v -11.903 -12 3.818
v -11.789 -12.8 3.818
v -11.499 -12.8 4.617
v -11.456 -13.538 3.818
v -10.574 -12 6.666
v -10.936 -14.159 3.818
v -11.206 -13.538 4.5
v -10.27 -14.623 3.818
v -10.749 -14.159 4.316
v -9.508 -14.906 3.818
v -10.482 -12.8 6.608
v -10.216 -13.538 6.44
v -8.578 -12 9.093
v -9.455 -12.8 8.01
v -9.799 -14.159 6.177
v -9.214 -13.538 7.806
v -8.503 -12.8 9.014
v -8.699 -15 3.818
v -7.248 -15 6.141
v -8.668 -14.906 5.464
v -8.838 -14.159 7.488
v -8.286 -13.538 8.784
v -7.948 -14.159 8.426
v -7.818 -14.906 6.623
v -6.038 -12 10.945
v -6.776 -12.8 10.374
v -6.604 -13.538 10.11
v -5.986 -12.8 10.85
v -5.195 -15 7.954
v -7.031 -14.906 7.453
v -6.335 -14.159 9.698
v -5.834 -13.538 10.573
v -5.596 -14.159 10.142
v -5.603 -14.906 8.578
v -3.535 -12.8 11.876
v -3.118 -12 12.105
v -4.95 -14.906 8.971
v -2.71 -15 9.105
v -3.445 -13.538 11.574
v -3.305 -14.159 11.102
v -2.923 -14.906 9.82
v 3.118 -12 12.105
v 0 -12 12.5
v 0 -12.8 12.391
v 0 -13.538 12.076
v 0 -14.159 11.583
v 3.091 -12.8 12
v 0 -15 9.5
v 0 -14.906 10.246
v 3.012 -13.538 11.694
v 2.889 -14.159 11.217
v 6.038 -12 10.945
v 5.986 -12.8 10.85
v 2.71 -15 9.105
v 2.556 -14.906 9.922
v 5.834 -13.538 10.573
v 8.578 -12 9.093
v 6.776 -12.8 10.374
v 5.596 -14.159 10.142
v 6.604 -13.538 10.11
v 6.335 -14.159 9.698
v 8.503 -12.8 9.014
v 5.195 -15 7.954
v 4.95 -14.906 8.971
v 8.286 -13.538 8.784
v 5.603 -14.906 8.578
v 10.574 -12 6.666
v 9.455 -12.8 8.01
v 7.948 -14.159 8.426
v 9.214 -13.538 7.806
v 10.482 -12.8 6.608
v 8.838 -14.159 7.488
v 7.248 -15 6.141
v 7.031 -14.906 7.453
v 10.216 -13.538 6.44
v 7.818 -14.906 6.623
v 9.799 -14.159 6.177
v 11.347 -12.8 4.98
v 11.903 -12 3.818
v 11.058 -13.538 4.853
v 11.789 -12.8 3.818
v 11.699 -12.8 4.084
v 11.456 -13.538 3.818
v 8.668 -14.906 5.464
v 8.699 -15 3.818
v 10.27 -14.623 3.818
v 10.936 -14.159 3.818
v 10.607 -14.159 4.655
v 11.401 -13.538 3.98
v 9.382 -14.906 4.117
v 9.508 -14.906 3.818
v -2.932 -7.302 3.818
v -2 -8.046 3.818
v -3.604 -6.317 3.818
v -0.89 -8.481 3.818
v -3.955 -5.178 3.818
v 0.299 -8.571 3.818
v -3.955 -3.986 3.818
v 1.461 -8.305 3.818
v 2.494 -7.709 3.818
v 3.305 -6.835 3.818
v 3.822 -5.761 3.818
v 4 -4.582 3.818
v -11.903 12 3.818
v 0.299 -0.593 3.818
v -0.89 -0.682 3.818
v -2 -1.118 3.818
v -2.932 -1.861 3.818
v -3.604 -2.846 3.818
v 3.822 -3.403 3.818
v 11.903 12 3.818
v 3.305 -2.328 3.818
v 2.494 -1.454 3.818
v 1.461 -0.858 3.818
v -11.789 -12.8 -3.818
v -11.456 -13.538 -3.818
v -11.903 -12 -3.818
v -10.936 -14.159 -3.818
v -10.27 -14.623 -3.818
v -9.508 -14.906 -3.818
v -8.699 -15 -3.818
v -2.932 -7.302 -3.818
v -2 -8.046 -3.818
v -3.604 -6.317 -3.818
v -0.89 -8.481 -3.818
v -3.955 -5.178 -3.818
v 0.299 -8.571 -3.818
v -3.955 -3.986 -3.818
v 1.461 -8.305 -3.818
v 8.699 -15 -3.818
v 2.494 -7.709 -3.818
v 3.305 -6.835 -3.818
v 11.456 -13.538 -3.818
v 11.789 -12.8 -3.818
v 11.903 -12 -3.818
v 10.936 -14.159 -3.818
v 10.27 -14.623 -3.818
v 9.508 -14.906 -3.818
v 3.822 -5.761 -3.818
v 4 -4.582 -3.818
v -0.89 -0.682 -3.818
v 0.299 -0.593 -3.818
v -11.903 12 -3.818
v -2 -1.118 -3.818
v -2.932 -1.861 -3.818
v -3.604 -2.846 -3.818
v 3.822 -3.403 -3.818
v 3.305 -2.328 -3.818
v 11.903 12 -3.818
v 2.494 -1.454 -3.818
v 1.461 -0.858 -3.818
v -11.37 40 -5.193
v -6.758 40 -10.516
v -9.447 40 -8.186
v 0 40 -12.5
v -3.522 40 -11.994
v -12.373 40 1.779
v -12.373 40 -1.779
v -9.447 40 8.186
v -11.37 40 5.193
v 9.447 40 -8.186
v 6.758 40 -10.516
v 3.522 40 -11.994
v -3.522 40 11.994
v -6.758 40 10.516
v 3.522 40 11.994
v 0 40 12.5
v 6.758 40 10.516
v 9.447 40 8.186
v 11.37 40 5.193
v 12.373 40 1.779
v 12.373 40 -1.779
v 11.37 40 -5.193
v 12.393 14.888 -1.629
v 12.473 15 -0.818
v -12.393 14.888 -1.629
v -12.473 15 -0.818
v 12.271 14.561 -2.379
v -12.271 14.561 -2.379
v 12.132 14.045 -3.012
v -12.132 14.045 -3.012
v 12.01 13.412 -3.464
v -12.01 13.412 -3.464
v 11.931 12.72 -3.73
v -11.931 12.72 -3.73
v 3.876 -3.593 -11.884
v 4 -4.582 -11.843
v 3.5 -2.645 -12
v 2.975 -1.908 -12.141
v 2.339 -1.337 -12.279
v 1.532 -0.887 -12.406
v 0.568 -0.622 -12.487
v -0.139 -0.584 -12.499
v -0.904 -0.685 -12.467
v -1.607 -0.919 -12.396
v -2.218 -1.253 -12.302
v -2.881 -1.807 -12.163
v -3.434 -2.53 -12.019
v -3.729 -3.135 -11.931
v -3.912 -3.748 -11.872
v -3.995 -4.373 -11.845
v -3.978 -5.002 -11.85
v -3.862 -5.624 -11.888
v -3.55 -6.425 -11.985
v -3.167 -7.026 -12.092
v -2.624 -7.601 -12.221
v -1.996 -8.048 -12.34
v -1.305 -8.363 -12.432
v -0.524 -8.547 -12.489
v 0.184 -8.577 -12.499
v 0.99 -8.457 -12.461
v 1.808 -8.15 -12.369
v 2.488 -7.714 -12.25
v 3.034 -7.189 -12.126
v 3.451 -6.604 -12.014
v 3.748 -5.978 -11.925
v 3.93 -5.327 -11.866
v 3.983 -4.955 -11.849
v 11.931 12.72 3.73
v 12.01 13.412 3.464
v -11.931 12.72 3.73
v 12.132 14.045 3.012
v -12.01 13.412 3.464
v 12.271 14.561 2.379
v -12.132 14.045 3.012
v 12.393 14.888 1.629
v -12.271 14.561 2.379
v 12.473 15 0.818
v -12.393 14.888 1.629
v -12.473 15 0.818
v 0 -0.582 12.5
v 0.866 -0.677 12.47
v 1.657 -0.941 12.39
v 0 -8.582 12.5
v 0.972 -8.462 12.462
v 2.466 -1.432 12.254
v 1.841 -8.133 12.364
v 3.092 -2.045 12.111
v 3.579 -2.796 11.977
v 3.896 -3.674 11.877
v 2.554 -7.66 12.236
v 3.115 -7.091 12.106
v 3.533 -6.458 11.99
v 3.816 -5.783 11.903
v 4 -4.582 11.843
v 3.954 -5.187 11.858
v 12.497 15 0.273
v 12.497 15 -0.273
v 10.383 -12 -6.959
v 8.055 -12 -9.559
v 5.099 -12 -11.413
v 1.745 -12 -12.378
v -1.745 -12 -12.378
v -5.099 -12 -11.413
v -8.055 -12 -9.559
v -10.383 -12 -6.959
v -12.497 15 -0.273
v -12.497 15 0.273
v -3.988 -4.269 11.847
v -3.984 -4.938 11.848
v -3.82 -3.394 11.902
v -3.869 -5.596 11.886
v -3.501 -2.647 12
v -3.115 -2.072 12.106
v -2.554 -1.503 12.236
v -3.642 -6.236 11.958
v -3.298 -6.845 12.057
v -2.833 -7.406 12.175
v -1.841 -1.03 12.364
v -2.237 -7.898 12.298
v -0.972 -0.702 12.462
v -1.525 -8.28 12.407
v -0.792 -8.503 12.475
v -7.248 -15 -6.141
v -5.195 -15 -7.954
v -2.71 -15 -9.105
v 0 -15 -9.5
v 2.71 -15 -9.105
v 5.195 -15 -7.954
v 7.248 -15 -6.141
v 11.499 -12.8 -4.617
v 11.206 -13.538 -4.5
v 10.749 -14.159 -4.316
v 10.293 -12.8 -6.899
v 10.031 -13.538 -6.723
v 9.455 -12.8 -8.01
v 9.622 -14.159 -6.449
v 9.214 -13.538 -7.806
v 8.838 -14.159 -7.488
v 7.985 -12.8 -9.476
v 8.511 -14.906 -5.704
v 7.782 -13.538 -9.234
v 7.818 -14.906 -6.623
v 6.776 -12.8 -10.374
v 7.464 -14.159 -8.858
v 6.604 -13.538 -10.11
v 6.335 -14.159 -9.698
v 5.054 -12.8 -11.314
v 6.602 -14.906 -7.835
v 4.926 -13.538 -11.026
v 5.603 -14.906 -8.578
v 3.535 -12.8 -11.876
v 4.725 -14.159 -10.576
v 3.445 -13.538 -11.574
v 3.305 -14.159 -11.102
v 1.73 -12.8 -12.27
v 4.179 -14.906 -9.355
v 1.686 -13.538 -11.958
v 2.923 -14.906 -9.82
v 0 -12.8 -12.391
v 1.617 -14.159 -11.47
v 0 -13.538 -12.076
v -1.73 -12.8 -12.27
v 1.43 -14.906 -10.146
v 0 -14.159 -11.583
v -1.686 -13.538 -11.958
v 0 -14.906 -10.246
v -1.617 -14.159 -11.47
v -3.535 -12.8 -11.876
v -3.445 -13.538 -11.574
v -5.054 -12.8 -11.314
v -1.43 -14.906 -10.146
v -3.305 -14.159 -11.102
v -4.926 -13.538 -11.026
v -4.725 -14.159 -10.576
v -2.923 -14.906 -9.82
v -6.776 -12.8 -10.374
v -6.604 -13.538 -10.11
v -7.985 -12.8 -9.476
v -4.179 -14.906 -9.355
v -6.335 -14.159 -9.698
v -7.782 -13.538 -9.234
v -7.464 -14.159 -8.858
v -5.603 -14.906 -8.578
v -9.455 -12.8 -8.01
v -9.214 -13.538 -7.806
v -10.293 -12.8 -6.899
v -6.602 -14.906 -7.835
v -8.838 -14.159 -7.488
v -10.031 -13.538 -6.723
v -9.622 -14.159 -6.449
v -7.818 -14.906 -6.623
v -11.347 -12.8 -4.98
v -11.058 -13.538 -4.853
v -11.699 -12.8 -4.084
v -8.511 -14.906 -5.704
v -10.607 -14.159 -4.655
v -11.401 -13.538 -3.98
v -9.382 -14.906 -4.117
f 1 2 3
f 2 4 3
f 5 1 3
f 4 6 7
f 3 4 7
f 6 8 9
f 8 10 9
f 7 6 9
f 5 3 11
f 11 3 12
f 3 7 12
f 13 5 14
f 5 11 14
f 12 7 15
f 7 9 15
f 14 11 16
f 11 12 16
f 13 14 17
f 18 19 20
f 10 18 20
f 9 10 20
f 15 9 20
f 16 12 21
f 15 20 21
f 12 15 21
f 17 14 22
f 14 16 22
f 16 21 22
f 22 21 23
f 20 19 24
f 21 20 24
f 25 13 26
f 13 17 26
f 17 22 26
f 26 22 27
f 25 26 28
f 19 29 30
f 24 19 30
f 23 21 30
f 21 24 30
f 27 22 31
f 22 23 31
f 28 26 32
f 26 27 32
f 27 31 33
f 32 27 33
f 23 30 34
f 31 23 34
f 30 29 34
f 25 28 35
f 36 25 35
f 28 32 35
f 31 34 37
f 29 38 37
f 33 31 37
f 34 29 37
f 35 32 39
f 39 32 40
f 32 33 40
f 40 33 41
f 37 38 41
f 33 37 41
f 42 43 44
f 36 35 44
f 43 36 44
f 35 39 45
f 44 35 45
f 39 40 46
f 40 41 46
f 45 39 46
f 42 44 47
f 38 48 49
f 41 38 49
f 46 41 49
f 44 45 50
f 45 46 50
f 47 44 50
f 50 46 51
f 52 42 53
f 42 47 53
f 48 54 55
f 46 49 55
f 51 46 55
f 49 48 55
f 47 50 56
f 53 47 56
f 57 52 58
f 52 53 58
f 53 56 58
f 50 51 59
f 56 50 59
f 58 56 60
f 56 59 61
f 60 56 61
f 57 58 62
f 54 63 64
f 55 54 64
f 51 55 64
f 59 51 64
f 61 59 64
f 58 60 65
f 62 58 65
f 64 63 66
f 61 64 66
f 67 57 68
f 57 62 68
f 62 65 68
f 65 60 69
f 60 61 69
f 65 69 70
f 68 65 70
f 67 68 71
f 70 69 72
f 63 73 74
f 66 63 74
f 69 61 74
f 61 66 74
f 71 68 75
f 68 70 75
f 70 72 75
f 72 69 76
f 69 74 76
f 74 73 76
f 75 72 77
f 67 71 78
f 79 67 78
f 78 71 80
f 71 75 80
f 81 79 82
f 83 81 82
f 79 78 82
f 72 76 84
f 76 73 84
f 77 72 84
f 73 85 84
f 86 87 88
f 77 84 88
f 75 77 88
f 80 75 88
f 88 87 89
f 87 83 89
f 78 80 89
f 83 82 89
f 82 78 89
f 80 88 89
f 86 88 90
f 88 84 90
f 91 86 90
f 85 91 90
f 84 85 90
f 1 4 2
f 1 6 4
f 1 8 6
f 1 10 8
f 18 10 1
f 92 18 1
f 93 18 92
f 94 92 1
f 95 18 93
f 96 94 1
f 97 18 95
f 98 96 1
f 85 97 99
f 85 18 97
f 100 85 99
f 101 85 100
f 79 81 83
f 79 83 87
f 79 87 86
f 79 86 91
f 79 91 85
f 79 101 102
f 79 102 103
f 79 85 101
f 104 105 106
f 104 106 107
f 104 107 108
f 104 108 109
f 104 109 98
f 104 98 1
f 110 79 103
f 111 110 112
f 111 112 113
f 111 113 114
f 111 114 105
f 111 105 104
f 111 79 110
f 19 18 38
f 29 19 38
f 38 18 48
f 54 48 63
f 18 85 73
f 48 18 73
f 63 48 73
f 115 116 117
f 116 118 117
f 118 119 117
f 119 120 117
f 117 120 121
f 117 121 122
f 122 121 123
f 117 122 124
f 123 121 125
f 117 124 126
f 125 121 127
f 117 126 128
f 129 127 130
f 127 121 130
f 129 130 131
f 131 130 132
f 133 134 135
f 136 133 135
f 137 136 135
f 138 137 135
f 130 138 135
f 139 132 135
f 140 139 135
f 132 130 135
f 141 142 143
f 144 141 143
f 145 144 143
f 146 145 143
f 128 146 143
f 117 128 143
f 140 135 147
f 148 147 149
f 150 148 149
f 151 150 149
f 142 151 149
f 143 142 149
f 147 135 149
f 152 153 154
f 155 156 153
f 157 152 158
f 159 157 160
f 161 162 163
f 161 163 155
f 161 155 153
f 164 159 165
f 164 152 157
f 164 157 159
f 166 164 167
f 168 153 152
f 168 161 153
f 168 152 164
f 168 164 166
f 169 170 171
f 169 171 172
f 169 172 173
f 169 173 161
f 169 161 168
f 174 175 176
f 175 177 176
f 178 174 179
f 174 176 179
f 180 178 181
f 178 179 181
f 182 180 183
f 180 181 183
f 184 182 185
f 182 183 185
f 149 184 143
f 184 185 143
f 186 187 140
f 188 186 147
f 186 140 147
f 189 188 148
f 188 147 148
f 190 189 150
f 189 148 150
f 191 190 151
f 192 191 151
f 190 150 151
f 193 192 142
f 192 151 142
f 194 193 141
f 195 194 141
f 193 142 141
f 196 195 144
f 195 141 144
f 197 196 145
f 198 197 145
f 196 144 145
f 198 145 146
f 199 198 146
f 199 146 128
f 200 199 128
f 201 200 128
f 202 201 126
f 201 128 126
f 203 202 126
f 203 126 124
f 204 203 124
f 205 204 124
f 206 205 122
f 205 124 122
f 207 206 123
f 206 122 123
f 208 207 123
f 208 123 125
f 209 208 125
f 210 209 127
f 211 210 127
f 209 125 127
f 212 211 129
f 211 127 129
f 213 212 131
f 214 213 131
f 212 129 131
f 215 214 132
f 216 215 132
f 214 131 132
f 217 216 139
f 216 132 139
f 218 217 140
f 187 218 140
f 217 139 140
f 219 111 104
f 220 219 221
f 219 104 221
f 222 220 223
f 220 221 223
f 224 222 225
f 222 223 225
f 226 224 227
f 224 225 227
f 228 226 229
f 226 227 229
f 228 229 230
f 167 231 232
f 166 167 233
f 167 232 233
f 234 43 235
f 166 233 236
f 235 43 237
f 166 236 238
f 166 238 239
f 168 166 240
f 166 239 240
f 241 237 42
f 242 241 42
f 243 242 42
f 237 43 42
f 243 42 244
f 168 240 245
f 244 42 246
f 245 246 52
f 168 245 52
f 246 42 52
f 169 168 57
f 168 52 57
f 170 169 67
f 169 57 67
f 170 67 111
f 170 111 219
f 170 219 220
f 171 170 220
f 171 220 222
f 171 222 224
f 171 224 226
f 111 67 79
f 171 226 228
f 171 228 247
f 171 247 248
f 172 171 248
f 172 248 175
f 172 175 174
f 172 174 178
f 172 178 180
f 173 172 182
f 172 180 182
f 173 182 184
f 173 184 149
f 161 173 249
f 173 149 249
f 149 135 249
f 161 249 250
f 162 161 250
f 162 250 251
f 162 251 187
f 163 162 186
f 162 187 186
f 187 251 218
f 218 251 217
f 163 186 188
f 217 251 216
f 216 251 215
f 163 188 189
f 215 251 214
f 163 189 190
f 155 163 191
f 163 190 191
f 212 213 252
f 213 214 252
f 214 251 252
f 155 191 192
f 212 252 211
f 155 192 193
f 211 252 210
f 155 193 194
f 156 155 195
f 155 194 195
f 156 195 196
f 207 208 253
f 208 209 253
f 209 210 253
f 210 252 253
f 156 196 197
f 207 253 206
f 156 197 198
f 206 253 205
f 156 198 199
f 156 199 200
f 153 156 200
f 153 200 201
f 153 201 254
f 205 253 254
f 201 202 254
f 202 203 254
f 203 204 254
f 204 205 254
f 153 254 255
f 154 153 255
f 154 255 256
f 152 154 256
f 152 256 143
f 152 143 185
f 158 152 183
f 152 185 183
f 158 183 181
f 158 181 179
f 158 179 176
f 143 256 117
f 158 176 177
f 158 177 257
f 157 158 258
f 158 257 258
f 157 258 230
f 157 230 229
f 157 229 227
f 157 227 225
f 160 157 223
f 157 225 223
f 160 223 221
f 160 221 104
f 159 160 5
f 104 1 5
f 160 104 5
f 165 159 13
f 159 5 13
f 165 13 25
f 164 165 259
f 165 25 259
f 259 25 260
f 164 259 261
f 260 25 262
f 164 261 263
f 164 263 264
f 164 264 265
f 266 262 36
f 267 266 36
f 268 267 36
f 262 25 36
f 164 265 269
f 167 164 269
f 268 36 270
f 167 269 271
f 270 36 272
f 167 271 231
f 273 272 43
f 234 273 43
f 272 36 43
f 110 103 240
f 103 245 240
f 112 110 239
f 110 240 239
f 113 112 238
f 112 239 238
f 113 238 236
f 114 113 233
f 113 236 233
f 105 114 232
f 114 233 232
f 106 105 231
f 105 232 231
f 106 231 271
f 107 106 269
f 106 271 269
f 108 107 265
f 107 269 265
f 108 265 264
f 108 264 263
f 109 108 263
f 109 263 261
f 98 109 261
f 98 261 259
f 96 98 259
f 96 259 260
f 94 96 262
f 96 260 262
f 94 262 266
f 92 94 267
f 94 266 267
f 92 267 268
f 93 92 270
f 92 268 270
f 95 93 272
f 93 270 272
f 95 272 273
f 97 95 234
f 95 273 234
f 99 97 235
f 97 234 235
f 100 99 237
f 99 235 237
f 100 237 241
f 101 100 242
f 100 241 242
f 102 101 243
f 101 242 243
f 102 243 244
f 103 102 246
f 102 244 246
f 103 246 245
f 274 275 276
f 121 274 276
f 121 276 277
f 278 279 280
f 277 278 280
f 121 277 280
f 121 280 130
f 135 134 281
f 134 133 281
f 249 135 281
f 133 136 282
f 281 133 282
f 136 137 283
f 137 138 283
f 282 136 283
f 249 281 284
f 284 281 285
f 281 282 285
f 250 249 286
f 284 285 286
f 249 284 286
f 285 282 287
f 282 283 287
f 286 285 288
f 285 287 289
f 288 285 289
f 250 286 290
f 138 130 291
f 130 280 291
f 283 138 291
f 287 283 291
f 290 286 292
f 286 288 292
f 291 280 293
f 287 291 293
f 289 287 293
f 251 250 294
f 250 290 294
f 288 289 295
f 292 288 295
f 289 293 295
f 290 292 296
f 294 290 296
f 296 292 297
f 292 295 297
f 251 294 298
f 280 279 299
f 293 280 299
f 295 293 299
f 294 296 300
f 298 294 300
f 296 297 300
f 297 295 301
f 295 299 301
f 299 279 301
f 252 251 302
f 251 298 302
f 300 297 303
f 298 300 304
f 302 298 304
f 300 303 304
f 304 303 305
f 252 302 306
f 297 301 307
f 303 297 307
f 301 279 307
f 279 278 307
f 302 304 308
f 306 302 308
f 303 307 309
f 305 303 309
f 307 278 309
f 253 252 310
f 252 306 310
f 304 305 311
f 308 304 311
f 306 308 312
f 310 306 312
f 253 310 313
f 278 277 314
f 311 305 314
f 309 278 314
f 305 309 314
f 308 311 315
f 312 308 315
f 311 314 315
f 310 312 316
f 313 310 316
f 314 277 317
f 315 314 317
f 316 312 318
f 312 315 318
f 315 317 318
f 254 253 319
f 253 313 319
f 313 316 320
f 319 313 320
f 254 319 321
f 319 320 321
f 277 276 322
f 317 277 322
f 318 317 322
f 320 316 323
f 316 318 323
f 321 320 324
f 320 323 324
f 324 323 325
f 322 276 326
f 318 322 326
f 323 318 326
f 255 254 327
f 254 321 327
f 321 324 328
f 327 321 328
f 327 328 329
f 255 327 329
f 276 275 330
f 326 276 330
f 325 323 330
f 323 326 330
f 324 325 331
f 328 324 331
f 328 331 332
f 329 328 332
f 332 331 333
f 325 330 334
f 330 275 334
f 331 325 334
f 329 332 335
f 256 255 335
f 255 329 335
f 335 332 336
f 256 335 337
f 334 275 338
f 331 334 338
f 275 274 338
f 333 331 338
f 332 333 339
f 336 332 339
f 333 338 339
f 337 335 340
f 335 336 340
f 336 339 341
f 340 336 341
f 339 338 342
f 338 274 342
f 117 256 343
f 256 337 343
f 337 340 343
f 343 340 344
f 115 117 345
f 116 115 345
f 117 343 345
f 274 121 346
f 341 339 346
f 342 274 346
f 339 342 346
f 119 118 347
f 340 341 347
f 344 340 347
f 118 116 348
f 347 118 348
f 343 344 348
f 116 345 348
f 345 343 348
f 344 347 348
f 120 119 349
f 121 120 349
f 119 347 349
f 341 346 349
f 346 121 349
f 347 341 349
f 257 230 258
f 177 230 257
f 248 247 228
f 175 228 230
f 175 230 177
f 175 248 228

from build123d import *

# Parameters (mm, degrees)
EXTRUDE_START       = -15
SKETCH_1_R          = 12.5
EXTRUDE_1_DEPTH     = 55
SKETCH_2_W          = 7.63538833
SKETCH_2_H          = 30
CUT_EXTRUDE_2_DEPTH = 25
FILLET_1_R          = 3
SKETCH_3_R          = 4
CUT_EXTRUDE_3_DEPTH = 25
FILLET_2_R          = 3


with BuildPart() as part:
    # Эскиз1 → Вытянуть1 (new body)
    with BuildSketch(Plane(origin=(0, 0, 0), x_dir=(1, 0, 0), z_dir=(0, 1, 0)).offset(EXTRUDE_START)):
        with Locations(Location((0, 0, 0), (0, 0, 270))):
            Circle(SKETCH_1_R)
    extrude(amount=EXTRUDE_1_DEPTH)

    # Эскиз2 → Вытянуть2 (cut, symmetric)
    with BuildSketch(Plane(origin=(0, 0, 0), x_dir=(0, 0, -1), z_dir=(1, 0, 0))):
        Rectangle(SKETCH_2_W, SKETCH_2_H)
    extrude(amount=CUT_EXTRUDE_2_DEPTH, both=True, mode=Mode.SUBTRACT)

    # Скругление1
    fillet_1_edges = [part.edges().sort_by_distance(p)[0] for p in [
        (0, -15, -12.5),
        (7.366438181, -15, 10.098791439),
    ]]
    fillet(fillet_1_edges, radius=FILLET_1_R)

    # Эскиз3 → Вытянуть3 (cut, symmetric)
    with BuildSketch(Plane.XY):
        with Locations((0, -4.581717599)):
            Circle(SKETCH_3_R)
    extrude(amount=CUT_EXTRUDE_3_DEPTH, both=True, mode=Mode.SUBTRACT)

    # Скругление2
    fillet_2_edges = [part.edges().sort_by_distance(p)[0] for p in [
        (0, 15, -3.817694165),
        (0, 15, 3.817694165),
    ]]
    fillet(fillet_2_edges, radius=FILLET_2_R)


solid = part.part
